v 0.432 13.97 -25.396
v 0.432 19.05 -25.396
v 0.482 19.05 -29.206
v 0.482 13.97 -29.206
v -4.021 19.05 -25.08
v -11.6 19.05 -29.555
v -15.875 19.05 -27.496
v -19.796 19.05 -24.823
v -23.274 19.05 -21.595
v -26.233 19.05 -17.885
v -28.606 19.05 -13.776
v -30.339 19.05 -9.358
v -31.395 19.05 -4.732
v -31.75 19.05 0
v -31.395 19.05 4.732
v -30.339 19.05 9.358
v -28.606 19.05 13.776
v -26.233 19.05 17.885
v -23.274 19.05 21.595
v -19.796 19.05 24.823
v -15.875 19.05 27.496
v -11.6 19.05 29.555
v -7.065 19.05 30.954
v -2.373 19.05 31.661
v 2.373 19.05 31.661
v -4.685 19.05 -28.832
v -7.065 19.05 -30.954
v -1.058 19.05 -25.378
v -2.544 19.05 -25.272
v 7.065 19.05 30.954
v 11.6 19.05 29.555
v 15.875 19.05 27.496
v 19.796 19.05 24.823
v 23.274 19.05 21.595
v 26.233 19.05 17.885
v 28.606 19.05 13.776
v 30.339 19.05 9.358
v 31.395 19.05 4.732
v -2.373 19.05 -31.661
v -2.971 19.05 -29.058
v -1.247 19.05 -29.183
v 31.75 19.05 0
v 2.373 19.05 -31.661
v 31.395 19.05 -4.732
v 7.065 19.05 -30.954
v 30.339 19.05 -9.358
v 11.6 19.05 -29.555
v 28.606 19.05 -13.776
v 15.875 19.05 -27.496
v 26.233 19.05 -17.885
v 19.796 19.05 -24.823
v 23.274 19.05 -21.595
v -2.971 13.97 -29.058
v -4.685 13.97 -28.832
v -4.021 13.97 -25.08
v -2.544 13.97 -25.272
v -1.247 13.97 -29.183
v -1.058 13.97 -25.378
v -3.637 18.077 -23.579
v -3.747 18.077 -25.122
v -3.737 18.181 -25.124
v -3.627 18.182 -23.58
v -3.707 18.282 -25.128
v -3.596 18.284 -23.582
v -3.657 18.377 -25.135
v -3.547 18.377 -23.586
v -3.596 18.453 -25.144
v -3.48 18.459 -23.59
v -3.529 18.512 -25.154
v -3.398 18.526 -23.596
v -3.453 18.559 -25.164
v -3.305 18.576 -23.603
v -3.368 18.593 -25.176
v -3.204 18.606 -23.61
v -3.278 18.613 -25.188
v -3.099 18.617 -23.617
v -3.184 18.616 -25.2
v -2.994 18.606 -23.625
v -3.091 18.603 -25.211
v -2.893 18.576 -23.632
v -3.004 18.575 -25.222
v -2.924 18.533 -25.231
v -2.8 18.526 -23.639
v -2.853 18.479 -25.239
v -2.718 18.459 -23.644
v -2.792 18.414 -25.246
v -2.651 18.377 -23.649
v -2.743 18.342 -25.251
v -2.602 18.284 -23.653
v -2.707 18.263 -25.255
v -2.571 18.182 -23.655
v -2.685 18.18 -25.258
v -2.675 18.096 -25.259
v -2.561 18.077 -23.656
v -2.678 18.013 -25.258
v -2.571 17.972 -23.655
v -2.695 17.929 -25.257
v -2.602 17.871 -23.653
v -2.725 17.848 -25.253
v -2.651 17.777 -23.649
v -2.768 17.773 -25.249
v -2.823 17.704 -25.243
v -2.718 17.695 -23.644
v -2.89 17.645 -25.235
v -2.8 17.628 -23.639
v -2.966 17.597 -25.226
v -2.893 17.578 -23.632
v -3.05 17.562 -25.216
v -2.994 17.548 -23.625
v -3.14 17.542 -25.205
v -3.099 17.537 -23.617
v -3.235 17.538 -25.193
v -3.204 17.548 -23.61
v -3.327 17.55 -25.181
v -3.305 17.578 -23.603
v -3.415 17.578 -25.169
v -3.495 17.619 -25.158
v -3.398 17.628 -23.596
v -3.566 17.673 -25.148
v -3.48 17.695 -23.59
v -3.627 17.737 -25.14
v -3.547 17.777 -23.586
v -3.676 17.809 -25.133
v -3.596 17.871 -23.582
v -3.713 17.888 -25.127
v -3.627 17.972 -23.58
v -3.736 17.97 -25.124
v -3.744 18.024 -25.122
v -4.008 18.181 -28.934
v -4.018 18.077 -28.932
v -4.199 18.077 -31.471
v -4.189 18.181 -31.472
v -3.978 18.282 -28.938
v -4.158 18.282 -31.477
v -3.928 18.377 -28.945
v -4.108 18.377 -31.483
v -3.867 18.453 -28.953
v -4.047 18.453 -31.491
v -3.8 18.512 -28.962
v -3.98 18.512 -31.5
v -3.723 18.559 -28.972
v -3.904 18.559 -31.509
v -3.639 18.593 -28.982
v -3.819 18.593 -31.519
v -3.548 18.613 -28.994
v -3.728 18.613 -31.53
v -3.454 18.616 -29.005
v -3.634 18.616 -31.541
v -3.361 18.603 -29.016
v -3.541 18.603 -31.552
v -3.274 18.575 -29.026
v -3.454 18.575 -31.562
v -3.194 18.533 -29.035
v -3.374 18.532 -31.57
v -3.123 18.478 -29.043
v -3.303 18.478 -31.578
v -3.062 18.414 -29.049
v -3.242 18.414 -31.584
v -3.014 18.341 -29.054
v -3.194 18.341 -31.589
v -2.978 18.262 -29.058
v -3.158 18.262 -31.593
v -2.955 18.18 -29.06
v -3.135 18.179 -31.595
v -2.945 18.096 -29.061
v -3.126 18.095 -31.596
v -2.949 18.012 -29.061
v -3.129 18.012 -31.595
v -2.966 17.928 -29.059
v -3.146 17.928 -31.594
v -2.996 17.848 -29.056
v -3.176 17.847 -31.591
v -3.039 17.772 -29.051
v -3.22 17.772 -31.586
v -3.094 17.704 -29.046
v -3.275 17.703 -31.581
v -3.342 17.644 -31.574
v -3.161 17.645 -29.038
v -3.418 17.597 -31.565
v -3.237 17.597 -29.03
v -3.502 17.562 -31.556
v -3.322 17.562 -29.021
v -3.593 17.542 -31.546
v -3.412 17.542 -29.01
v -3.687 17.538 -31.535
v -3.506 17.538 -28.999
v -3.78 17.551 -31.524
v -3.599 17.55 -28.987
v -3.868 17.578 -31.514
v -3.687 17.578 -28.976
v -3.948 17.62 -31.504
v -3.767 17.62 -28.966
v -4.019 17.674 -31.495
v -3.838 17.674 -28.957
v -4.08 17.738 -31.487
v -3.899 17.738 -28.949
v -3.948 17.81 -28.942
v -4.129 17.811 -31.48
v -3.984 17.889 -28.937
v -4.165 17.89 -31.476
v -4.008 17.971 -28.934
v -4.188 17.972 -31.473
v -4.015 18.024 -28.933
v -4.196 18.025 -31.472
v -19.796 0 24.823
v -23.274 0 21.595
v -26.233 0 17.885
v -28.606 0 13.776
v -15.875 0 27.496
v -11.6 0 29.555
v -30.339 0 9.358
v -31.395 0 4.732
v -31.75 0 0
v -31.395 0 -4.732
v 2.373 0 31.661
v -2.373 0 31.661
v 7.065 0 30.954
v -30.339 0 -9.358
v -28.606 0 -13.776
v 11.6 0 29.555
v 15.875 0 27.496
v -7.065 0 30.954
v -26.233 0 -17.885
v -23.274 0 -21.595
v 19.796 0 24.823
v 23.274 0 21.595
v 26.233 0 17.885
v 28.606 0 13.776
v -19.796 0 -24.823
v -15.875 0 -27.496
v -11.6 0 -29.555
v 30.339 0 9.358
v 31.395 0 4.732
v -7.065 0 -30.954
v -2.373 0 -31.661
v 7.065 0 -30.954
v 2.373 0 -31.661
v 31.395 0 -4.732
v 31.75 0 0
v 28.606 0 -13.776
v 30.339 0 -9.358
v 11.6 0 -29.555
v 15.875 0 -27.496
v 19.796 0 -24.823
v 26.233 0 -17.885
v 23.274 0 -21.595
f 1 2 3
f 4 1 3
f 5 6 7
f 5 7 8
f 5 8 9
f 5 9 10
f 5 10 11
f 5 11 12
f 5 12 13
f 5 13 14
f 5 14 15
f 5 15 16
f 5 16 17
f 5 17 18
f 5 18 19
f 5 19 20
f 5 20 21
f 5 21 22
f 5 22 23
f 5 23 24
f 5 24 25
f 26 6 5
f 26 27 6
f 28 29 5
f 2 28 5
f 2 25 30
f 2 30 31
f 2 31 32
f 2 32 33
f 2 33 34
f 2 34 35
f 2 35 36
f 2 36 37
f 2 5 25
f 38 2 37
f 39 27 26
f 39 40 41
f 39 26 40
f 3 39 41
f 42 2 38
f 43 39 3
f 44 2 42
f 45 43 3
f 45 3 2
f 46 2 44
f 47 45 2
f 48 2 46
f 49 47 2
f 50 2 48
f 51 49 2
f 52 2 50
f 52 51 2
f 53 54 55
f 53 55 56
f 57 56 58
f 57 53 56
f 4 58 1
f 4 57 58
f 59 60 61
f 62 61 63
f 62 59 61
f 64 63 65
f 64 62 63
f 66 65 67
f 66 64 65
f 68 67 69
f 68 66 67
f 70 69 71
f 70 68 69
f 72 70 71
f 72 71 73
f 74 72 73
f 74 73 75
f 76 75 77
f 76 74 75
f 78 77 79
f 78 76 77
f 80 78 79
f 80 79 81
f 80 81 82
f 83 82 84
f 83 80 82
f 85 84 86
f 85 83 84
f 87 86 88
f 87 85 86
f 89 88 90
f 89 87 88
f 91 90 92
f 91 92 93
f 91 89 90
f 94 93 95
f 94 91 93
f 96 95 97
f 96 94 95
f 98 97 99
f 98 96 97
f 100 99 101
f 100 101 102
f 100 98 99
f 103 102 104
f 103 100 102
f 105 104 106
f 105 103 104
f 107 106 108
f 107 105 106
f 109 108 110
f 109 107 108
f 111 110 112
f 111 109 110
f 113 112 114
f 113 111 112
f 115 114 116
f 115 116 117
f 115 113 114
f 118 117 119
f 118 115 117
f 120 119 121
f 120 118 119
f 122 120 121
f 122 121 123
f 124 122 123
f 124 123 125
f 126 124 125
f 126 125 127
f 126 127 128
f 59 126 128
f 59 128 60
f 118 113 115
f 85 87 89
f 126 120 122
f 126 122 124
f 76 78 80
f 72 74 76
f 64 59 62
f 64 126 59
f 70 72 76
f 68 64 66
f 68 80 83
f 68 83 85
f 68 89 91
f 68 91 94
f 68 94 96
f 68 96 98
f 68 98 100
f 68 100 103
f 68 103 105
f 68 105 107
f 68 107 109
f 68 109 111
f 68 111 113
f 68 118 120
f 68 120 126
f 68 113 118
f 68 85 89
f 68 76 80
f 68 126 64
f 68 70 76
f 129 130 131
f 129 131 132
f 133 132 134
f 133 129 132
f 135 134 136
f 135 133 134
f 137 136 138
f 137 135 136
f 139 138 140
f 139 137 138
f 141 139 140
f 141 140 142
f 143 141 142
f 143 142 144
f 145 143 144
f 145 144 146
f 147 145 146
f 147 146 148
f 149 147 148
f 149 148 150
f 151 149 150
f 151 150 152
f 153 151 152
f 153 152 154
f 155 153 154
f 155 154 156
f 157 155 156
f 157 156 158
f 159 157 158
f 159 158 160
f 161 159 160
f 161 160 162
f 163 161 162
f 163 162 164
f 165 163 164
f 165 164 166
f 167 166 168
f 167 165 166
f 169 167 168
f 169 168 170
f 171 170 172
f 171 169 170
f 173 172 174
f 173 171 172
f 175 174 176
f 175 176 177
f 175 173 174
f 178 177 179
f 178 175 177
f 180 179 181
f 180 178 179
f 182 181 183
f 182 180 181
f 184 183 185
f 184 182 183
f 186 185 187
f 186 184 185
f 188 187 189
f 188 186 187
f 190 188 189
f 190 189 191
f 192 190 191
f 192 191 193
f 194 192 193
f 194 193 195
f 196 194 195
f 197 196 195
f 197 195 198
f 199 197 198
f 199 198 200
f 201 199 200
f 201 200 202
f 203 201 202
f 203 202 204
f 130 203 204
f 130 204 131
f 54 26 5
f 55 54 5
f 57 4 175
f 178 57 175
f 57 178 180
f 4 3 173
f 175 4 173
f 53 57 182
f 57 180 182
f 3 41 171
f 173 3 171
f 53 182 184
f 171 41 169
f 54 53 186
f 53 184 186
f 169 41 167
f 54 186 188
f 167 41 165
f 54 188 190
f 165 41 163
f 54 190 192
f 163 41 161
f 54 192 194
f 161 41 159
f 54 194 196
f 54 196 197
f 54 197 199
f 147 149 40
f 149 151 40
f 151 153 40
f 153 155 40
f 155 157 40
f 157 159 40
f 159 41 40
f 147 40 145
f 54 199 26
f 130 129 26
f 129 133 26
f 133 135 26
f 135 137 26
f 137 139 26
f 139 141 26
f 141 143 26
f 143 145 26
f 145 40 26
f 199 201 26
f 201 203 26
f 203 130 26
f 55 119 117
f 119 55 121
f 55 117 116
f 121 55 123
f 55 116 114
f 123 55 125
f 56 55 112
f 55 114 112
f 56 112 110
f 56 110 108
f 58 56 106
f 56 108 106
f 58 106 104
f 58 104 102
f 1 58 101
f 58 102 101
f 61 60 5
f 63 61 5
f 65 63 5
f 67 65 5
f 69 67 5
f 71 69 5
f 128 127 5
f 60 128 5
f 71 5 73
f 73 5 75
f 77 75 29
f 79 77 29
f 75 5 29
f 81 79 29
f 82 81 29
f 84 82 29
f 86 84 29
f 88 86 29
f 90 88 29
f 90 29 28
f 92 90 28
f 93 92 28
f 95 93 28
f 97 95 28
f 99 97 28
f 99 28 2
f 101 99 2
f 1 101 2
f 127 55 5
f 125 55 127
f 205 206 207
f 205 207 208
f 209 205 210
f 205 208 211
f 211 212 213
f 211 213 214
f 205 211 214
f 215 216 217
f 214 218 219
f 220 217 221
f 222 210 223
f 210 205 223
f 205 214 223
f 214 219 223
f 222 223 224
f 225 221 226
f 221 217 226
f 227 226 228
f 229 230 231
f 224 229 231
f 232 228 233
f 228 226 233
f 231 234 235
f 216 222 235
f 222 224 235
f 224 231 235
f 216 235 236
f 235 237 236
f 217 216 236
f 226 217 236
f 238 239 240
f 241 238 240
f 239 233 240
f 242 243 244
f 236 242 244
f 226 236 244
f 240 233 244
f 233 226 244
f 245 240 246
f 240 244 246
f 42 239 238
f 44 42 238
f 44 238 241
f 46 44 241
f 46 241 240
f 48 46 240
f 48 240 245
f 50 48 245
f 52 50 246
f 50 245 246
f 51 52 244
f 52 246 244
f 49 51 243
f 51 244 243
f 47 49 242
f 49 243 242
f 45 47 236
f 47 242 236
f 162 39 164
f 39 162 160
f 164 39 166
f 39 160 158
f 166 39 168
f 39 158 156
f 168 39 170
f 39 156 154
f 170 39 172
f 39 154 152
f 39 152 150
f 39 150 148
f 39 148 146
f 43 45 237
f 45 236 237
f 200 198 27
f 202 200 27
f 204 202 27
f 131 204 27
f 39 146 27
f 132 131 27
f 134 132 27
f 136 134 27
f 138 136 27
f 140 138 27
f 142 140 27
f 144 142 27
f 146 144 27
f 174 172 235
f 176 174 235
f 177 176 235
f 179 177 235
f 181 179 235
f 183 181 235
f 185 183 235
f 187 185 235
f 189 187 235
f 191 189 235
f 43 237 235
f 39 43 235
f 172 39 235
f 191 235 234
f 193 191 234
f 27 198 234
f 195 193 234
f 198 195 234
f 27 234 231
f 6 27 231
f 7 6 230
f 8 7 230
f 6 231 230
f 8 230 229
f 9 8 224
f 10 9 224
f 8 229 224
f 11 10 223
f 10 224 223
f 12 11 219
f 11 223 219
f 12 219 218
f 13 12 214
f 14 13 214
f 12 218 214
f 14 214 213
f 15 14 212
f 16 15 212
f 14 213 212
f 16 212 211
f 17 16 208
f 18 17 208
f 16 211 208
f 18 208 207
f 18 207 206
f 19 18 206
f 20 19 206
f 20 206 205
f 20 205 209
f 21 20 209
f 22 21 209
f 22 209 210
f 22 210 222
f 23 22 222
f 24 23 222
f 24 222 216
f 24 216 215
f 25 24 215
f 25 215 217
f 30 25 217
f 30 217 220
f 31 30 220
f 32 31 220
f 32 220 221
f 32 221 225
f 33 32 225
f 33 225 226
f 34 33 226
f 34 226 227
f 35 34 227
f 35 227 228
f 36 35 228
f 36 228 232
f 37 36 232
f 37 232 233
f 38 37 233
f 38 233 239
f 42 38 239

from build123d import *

# Parameters (mm, degrees)
SKETCH1_R               = 31.75
BOSS_EXTRUDE1_DEPTH     = 19.05
CUT_EXTRUDE1_DEPTH      = 5.08
SKETCH4_R               = 0.539725026
CUT_EXTRUDE2_DEPTH      = 9.62045401
CUT_EXTRUDE2_DEPTH_BACK = 1.524


with BuildPart() as part:
    # Sketch1 → Boss-Extrude1 (new body)
    with BuildSketch(Plane(origin=(0, 0, 0), x_dir=(1, 0, 0), z_dir=(0, 1, 0))):
        Circle(SKETCH1_R)
    extrude(amount=BOSS_EXTRUDE1_DEPTH)

    # Sketch2 → Cut-Extrude1 (cut)
    with BuildSketch(Plane(origin=(0, 19.05, 0), x_dir=(1, 0, 0), z_dir=(0, 1, 0))):
        with BuildLine():
            Line((0.431861346, 25.396328392), (0.481566937, 29.206030084))
            ThreePointArc((0.481566937, 29.206030084), (-2.110193645, 29.133677811), (-4.685328245, 28.831784531))
            Line((-4.685328245, 28.831784531), (-4.021364533, 25.079645677))
            ThreePointArc((-4.021364533, 25.079645677), (-1.801722861, 25.336017736), (0.431861346, 25.396328392))
        make_face()
    extrude(amount=-CUT_EXTRUDE1_DEPTH, mode=Mode.SUBTRACT)

    # Sketch4 → Cut-Extrude2 (cut, two sides)
    with BuildSketch(Plane(origin=(-1.794751593, 0, -25.237987034), x_dir=(-0.997481013, 0, 0.070933971), z_dir=(-0.070933971, 0, -0.997481013))) as cut_extrude2_sk:
        with Locations((1.415895648, 18.077123557)):
            Circle(SKETCH4_R)
    extrude(amount=CUT_EXTRUDE2_DEPTH, mode=Mode.SUBTRACT)
    extrude(cut_extrude2_sk.sketch, amount=-CUT_EXTRUDE2_DEPTH_BACK, mode=Mode.SUBTRACT)


solid = part.part
